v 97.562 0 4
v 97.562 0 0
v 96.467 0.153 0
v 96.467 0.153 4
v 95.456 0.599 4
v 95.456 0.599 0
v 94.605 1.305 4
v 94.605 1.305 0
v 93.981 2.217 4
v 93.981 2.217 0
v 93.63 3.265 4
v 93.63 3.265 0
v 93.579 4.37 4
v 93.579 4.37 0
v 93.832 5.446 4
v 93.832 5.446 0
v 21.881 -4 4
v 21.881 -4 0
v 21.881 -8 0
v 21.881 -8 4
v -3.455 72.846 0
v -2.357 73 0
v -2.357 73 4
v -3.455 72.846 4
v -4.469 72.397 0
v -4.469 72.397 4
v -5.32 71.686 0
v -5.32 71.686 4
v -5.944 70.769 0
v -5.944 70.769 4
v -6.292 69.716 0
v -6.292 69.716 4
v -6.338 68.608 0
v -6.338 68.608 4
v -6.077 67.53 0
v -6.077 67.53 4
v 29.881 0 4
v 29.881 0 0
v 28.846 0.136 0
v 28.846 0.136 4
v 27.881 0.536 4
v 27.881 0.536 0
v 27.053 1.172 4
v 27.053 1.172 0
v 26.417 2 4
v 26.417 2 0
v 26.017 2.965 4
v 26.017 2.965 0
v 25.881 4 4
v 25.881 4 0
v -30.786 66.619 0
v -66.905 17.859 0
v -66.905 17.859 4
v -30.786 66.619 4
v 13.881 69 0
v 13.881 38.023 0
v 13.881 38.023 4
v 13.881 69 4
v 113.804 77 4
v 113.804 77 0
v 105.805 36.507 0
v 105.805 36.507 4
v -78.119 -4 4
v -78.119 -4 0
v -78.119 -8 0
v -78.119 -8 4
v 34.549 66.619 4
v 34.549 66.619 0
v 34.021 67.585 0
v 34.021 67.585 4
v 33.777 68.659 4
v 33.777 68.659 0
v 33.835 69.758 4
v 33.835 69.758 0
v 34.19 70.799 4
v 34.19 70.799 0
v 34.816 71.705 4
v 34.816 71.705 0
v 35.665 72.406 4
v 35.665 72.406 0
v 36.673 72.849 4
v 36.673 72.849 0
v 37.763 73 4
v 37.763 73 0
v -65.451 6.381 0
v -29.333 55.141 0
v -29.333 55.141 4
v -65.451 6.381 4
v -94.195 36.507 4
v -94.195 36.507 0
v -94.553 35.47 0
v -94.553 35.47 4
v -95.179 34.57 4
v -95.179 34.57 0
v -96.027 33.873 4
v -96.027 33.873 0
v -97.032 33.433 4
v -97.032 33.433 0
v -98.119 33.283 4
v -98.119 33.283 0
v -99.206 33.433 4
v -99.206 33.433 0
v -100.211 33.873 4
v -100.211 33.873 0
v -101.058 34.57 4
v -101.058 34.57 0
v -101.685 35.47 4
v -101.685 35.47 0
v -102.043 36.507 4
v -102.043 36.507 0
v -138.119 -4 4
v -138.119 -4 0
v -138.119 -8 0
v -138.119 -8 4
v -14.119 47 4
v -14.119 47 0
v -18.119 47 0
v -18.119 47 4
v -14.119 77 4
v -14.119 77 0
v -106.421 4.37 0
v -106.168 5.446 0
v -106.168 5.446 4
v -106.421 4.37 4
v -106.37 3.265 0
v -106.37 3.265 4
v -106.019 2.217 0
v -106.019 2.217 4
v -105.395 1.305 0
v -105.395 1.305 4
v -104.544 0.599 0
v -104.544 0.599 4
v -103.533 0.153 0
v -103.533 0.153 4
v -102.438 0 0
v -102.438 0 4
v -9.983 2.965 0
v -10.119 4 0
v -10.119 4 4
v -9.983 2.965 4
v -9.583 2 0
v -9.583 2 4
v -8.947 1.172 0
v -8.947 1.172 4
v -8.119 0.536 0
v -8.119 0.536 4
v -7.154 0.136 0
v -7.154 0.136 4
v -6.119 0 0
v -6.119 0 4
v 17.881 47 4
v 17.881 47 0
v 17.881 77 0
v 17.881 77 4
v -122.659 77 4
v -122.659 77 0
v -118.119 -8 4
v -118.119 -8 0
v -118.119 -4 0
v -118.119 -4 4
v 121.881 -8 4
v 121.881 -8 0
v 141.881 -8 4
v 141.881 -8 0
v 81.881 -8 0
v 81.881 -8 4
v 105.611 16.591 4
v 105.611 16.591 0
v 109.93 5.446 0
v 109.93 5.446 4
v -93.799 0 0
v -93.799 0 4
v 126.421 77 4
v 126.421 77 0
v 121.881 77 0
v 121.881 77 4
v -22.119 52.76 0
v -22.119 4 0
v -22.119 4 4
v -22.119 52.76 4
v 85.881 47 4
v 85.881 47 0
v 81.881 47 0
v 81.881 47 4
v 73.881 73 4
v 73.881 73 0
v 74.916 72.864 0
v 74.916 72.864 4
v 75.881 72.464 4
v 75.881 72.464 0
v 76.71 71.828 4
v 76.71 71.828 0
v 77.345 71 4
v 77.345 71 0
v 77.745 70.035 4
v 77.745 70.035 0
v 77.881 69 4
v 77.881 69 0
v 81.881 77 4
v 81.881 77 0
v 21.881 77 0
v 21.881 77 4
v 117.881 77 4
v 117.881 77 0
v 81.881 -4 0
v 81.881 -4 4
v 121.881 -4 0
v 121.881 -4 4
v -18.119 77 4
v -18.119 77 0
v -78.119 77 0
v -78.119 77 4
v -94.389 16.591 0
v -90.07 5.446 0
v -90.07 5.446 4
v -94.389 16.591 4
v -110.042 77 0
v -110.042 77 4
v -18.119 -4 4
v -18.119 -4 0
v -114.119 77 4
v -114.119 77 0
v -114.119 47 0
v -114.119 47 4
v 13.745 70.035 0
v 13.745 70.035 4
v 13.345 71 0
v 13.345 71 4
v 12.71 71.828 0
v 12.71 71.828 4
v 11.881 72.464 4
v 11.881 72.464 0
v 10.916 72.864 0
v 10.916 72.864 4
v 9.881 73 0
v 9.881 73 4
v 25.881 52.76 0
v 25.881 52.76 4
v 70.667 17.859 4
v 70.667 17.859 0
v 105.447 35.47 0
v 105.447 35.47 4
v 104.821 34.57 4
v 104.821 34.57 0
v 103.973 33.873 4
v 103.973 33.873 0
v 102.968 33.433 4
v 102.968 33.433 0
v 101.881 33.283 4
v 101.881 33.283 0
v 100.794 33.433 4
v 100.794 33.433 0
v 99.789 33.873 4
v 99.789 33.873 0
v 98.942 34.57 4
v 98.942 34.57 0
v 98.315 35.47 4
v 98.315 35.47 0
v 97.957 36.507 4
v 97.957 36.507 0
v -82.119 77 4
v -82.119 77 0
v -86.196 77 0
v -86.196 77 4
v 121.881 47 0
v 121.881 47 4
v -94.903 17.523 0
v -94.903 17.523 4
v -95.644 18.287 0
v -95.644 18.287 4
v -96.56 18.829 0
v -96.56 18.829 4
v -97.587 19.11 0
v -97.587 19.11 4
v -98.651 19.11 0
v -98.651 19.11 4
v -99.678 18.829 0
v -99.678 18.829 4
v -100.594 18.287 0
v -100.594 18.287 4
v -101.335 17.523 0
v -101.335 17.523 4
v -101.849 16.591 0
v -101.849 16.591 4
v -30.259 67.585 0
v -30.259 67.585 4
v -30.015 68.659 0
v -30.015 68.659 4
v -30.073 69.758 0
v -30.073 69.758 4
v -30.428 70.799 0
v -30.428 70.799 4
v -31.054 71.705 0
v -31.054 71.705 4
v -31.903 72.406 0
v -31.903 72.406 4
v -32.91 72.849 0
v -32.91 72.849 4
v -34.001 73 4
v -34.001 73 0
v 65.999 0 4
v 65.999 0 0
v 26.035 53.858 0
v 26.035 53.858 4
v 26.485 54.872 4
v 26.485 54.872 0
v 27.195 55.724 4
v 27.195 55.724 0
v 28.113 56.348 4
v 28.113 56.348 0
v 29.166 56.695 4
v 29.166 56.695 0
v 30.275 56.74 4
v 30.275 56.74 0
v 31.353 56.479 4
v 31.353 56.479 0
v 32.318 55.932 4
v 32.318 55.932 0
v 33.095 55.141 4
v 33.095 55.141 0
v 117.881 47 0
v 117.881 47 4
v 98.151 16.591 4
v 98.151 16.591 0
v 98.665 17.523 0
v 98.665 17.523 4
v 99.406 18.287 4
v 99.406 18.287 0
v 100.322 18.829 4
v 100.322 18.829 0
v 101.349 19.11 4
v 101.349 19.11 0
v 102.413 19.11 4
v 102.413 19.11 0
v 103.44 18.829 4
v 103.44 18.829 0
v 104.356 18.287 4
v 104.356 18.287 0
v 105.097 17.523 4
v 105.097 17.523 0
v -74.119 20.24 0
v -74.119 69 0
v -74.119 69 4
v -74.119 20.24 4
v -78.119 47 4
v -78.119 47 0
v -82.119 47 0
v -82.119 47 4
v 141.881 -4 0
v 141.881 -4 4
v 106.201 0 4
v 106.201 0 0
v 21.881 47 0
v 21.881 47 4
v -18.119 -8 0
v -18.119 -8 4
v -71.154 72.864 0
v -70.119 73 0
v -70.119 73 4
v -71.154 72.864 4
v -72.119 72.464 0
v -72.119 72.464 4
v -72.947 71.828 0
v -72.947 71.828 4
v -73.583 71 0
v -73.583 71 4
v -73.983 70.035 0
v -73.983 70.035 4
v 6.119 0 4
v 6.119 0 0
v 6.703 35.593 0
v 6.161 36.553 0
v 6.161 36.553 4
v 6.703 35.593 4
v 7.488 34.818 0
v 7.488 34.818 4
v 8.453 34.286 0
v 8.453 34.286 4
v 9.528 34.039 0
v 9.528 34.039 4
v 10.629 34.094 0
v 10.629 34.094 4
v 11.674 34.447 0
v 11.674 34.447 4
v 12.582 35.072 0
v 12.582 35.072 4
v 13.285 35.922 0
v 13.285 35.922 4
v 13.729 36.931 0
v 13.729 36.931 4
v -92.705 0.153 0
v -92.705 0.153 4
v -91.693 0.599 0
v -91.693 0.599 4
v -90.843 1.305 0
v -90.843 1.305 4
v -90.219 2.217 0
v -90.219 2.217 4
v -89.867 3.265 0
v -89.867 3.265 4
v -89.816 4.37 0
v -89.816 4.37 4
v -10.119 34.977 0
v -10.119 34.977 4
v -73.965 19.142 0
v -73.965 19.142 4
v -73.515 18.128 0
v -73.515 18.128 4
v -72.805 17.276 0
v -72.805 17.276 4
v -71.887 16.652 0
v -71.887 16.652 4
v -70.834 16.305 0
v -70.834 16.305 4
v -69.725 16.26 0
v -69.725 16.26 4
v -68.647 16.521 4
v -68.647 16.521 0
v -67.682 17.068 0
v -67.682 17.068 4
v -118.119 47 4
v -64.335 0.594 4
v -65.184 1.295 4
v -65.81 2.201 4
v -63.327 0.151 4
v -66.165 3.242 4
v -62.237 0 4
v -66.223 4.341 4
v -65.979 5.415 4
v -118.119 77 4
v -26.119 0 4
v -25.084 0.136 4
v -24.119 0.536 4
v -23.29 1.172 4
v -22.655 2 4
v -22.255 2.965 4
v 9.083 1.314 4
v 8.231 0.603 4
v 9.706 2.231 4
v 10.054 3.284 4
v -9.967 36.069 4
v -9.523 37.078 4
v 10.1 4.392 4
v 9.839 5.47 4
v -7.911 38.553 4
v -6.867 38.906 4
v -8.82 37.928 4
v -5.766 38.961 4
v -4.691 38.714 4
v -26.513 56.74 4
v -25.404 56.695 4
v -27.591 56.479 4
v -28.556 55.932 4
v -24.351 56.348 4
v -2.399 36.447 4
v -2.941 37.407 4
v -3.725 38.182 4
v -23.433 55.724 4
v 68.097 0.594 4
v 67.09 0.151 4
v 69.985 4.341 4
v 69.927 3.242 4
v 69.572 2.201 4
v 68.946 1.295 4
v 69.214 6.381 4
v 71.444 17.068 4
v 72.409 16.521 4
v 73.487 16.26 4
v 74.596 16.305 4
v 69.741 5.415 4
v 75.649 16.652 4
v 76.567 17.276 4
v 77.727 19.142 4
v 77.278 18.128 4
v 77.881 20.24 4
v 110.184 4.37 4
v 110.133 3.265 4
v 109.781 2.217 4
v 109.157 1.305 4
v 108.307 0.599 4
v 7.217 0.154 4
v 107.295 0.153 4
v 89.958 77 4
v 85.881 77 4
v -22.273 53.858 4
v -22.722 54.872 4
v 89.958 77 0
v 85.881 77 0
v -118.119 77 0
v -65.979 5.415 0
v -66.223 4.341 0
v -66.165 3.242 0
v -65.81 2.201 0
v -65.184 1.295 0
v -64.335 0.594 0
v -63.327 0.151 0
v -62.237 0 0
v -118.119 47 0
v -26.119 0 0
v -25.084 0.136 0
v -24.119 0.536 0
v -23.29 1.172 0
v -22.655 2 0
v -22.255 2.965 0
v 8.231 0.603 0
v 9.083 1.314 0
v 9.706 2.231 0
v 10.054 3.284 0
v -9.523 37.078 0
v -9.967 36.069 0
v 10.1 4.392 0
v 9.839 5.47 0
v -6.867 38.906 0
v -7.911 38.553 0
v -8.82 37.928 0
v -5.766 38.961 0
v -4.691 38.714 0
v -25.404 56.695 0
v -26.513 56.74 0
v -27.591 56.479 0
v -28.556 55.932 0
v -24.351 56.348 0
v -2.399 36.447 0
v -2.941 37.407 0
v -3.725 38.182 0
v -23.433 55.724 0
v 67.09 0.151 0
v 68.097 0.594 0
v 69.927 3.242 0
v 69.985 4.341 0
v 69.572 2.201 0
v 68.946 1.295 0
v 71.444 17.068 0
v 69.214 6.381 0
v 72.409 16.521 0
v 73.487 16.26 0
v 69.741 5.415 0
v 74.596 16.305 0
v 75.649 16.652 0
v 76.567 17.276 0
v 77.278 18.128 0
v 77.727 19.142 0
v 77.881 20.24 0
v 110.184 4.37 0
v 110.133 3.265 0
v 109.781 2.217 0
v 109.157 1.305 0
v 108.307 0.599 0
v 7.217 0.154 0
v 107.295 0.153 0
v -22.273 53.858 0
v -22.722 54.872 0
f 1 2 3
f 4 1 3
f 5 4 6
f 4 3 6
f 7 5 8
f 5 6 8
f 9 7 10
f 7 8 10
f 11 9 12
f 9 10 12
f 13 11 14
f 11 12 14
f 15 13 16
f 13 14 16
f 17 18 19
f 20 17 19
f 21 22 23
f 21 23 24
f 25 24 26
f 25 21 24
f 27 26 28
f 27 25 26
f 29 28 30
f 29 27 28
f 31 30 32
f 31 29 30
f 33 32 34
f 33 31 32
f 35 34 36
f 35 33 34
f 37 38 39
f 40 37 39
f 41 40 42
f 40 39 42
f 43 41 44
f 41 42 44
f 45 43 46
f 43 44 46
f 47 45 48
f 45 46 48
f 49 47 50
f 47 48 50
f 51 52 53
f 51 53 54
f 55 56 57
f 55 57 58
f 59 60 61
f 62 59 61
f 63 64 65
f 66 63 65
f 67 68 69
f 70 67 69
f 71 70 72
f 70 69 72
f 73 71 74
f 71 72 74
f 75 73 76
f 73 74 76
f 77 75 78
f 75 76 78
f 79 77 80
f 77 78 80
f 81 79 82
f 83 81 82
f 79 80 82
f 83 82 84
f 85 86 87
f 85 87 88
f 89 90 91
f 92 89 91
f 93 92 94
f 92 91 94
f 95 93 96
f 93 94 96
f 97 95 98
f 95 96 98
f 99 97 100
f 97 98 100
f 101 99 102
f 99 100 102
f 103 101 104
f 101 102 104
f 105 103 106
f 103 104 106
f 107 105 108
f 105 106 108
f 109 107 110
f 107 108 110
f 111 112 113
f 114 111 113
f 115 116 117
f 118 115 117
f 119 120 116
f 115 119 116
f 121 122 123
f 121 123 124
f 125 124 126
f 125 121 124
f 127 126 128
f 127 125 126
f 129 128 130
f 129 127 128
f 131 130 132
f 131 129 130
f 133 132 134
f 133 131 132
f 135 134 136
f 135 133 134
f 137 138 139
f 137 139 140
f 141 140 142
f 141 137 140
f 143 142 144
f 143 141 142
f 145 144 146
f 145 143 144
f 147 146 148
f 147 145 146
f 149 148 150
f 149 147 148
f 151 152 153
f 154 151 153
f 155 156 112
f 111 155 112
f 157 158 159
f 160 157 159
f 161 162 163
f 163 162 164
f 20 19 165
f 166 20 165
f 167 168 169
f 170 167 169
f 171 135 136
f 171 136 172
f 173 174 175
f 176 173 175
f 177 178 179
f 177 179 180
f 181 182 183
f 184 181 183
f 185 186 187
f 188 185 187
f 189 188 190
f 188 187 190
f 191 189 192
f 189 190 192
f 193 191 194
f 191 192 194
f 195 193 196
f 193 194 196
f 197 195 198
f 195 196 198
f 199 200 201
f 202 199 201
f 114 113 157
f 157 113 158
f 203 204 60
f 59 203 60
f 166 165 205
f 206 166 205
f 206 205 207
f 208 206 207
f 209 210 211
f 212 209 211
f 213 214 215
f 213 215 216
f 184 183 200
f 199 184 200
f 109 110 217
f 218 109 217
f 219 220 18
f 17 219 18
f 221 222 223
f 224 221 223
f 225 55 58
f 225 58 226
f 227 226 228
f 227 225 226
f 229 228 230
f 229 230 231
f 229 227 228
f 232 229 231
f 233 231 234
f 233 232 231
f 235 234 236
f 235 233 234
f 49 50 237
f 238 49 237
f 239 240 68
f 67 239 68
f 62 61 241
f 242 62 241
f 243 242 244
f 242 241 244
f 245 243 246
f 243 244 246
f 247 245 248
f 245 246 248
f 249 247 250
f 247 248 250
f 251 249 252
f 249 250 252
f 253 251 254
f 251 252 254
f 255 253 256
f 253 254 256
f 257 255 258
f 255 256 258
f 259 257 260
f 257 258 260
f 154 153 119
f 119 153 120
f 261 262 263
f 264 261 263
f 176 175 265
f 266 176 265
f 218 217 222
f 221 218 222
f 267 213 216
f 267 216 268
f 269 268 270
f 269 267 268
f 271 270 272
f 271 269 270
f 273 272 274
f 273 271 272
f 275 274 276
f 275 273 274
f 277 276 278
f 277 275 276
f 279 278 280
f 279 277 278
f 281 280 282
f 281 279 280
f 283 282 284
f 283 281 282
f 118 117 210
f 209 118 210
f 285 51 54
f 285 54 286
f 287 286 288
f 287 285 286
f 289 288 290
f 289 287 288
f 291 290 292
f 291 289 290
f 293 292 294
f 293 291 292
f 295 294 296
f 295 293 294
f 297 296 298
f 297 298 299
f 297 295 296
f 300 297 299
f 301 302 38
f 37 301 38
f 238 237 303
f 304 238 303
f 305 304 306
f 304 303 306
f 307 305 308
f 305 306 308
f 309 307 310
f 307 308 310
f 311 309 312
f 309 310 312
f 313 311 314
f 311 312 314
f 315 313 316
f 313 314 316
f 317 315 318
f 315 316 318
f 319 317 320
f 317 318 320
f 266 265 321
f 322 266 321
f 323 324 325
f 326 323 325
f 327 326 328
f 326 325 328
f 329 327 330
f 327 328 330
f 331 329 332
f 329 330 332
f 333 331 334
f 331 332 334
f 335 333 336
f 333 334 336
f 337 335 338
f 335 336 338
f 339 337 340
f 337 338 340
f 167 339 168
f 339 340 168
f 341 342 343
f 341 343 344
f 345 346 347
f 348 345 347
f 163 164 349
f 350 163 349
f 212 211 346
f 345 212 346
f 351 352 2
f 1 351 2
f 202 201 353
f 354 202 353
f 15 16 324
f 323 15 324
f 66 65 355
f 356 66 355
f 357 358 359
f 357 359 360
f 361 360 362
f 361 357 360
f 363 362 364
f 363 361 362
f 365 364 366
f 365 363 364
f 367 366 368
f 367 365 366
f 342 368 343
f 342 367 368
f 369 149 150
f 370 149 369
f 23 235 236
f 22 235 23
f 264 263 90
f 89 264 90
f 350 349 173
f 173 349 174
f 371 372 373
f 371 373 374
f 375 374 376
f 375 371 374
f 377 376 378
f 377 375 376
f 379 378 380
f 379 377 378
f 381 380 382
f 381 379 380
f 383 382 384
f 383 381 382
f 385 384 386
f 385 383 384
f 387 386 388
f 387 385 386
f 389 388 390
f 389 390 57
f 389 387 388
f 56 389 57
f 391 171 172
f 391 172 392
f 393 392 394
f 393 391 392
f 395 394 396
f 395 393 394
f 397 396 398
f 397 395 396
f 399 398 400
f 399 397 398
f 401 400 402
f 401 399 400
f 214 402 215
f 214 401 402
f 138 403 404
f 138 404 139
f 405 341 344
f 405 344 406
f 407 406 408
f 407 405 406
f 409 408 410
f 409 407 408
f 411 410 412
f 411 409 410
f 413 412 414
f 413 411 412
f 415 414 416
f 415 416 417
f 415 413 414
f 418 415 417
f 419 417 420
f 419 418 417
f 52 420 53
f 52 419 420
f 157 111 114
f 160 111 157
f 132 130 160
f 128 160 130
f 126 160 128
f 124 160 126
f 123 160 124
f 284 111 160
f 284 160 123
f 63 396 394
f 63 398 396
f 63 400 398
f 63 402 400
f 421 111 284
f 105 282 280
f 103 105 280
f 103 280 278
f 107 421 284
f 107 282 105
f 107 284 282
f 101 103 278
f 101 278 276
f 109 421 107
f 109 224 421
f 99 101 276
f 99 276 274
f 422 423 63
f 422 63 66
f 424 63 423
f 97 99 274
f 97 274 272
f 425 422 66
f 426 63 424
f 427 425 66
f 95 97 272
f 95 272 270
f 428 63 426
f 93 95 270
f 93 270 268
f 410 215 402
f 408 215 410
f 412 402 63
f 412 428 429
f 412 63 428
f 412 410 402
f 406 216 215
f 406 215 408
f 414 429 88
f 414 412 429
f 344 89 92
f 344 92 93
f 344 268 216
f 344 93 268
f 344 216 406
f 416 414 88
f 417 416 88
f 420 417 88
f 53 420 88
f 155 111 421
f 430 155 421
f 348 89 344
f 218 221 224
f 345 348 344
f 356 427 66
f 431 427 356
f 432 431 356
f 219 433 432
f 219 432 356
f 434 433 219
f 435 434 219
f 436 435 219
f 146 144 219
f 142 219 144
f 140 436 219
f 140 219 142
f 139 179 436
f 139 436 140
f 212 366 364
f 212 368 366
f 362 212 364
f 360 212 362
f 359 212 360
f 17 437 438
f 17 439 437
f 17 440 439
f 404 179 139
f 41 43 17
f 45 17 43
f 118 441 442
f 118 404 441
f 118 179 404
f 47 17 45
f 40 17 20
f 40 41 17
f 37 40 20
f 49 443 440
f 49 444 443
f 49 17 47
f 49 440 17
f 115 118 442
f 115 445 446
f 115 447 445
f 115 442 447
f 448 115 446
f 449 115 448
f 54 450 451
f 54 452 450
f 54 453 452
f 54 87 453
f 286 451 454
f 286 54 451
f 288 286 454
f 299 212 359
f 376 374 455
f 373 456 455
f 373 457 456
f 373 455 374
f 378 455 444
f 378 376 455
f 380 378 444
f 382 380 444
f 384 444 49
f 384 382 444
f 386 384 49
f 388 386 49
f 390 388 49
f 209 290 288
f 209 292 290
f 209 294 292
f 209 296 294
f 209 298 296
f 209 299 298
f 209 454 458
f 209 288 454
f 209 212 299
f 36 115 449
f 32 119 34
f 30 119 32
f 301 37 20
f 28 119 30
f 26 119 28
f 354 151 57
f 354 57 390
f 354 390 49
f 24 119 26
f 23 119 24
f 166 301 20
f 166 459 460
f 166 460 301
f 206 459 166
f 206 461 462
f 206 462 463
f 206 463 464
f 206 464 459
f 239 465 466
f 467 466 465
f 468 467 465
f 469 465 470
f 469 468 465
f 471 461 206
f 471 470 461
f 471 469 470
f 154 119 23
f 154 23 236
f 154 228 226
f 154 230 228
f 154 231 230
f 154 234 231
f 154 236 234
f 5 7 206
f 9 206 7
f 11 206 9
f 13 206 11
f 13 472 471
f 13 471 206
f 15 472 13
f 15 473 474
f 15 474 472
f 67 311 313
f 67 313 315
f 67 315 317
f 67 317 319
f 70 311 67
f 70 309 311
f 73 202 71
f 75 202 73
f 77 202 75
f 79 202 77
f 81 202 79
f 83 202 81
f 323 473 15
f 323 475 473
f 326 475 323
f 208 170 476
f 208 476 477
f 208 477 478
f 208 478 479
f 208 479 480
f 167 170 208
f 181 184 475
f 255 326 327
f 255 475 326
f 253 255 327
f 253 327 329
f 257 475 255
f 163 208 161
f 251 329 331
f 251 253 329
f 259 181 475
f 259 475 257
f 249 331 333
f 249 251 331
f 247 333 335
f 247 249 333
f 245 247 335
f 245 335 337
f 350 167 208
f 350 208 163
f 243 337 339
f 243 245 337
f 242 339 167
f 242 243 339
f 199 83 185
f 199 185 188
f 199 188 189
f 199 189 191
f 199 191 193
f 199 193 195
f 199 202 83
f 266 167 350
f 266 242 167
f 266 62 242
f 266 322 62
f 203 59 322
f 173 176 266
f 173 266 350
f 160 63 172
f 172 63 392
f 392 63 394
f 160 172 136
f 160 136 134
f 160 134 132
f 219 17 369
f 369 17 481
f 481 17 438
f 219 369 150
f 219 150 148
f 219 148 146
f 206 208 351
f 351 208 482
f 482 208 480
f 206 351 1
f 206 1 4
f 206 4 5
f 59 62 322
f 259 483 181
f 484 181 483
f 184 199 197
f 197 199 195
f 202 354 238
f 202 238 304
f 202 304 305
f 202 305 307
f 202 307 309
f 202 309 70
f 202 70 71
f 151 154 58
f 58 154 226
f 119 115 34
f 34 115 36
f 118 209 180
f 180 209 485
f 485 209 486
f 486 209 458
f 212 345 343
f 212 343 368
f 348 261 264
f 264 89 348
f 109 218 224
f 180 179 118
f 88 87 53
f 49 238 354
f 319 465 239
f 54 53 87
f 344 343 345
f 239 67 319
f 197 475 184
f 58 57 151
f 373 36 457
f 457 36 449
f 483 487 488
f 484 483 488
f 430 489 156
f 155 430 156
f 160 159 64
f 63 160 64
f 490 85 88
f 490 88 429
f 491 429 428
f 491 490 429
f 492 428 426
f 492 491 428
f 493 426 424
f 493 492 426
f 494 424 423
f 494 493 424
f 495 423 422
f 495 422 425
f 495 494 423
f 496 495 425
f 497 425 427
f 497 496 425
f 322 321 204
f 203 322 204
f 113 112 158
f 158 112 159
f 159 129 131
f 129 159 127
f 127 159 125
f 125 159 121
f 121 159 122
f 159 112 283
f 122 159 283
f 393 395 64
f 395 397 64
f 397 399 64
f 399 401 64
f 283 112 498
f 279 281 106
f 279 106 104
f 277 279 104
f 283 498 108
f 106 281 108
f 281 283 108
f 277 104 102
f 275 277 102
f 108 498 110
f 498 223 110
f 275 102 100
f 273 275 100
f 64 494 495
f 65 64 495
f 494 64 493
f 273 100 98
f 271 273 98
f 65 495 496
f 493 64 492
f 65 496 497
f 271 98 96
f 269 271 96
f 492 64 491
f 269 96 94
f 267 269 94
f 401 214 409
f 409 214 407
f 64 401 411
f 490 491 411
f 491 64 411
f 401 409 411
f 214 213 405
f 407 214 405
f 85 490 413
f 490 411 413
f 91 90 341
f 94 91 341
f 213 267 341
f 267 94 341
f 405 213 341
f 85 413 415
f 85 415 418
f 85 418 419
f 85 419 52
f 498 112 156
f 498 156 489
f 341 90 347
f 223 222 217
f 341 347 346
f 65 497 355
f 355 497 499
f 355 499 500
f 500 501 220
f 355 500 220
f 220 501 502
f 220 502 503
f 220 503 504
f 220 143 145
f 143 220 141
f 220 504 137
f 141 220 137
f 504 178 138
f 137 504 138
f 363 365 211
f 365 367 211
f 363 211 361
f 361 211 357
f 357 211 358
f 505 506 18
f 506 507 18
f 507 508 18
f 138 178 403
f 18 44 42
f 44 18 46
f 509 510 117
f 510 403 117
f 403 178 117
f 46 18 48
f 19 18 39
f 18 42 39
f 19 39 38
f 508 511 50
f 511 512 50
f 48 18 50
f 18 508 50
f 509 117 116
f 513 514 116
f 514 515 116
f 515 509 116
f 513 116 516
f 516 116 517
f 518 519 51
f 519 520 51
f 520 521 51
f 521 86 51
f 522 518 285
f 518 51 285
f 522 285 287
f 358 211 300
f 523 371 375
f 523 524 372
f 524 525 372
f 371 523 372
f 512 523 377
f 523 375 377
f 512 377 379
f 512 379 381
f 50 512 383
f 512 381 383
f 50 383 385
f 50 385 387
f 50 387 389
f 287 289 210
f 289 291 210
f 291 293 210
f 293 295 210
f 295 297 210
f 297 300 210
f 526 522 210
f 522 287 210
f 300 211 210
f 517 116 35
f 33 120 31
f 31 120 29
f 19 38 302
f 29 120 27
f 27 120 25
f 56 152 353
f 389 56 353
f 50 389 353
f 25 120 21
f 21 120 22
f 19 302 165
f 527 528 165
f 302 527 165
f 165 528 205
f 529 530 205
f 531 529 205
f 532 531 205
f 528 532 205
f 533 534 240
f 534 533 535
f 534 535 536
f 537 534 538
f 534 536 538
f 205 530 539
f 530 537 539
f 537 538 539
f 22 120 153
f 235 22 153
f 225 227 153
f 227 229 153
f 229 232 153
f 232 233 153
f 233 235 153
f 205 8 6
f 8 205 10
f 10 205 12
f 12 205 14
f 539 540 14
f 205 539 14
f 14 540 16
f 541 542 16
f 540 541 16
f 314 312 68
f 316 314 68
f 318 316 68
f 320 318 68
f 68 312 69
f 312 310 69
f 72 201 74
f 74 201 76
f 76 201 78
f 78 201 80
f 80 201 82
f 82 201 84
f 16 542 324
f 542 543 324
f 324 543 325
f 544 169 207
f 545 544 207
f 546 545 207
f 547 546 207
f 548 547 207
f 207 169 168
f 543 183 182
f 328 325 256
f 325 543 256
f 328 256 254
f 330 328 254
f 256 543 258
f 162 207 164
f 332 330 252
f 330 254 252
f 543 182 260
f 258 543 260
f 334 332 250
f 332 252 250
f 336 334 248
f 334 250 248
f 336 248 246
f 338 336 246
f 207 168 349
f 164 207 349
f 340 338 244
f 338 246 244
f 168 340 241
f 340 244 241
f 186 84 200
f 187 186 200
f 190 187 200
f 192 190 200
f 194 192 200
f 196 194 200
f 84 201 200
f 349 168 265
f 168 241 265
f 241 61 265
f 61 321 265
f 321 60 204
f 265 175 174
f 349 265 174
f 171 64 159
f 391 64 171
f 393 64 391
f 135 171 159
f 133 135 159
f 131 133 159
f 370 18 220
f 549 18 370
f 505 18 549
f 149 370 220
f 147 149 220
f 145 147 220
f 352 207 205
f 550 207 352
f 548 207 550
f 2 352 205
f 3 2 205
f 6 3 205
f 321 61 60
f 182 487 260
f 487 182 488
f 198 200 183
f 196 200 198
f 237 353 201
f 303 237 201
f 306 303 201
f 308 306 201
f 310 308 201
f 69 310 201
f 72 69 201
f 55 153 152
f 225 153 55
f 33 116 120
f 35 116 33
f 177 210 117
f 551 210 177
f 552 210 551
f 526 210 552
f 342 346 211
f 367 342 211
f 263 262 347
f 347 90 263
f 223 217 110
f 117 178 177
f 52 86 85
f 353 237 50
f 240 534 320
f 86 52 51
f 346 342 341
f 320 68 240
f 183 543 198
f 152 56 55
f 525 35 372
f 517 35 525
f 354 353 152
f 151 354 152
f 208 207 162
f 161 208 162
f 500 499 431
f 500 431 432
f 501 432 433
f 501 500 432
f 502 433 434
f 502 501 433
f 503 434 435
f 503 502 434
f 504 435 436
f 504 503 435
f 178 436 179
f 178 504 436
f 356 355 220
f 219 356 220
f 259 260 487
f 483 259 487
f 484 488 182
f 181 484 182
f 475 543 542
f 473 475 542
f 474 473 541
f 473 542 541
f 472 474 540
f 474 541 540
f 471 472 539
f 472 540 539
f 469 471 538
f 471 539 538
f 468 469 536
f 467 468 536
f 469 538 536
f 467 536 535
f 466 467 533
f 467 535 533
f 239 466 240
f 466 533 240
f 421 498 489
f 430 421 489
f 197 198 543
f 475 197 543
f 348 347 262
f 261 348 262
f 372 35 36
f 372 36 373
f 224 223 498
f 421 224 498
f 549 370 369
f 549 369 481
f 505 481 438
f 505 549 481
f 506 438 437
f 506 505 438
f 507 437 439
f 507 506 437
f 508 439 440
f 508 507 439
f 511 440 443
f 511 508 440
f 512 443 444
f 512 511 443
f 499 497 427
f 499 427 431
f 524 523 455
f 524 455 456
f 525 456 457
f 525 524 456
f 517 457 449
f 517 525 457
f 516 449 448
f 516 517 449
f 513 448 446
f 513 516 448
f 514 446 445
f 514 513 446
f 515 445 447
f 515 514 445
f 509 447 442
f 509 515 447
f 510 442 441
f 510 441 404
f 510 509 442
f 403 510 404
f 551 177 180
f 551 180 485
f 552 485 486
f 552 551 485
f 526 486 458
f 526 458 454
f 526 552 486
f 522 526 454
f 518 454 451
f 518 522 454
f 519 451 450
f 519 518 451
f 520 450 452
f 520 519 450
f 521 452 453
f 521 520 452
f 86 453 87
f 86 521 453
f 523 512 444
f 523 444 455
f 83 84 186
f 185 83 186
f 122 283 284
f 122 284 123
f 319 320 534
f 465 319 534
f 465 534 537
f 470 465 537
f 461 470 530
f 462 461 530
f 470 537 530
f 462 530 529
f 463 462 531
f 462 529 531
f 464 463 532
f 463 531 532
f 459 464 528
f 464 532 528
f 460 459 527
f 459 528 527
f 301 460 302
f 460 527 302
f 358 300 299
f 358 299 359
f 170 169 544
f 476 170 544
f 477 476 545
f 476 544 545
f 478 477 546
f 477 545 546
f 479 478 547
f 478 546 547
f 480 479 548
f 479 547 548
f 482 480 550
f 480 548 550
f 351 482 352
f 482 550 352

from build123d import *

# Parameters (mm, degrees)
BOSS_EXTRUDE1_DEPTH = 4


with BuildPart() as part:
    # Sketch2 → Boss-Extrude1 (new body)
    with BuildSketch(Plane.XY):
        with BuildLine():
            Line((-138.118918248, -4), (-138.118918248, -8))
            Line((-138.118918248, -8), (-118.118918248, -8))
            Line((-118.118918248, -8), (-118.118918248, -4))
            Line((-118.118918248, -4), (-78.118918248, -4))
            Line((-78.118918248, -4), (-78.118918248, -8))
            Line((-78.118918248, -8), (-18.118918248, -8))
            Line((-18.118918248, -8), (-18.118918248, -4))
            Line((-18.118918248, -4), (21.881081752, -4))
            Line((21.881081752, -4), (21.881081752, -8))
            Line((21.881081752, -8), (81.881081752, -8))
            Line((81.881081752, -8), (81.881081752, -4))
            Line((81.881081752, -4), (121.881081752, -4))
            Line((121.881081752, -4), (121.881081752, -8))
            Line((121.881081752, -8), (141.881081752, -8))
            Line((141.881081752, -8), (141.881081752, -4))
            Line((141.881081752, -4), (126.420932439, 77))
            Line((126.420932439, 77), (121.881081752, 77))
            Line((121.881081752, 77), (121.881081752, 47))
            Line((121.881081752, 47), (117.881081752, 47))
            Line((117.881081752, 47), (117.881081752, 77))
            Line((117.881081752, 77), (113.803791589, 77))
            Line((113.803791589, 77), (105.805256721, 36.507417232))
            ThreePointArc((105.805256721, 36.507417232), (101.881081752, 33.282562905), (97.956906783, 36.507417232))
            Line((97.956906783, 36.507417232), (89.958371916, 77))
            Line((89.958371916, 77), (85.881081752, 77))
            Line((85.881081752, 77), (85.881081752, 47))
            Line((85.881081752, 47), (81.881081752, 47))
            Line((81.881081752, 47), (81.881081752, 77))
            Line((81.881081752, 77), (21.881081752, 77))
            Line((21.881081752, 77), (21.881081752, 47))
            Line((21.881081752, 47), (17.881081752, 47))
            Line((17.881081752, 47), (17.881081752, 77))
            Line((17.881081752, 77), (-14.118918248, 77))
            Line((-14.118918248, 77), (-14.118918248, 47))
            Line((-14.118918248, 47), (-18.118918248, 47))
            Line((-18.118918248, 47), (-18.118918248, 77))
            Line((-18.118918248, 77), (-78.118918248, 77))
            Line((-78.118918248, 77), (-78.118918248, 47))
            Line((-78.118918248, 47), (-82.118918248, 47))
            Line((-82.118918248, 47), (-82.118918248, 77))
            Line((-82.118918248, 77), (-86.196208411, 77))
            Line((-86.196208411, 77), (-94.194743279, 36.507417232))
            ThreePointArc((-94.194743279, 36.507417232), (-98.118918248, 33.282562905), (-102.043093217, 36.507417232))
            Line((-102.043093217, 36.507417232), (-110.041628084, 77))
            Line((-110.041628084, 77), (-114.118918248, 77))
            Line((-114.118918248, 77), (-114.118918248, 47))
            Line((-114.118918248, 47), (-118.118918248, 47))
            Line((-118.118918248, 47), (-118.118918248, 77))
            Line((-118.118918248, 77), (-122.658768935, 77))
            Line((-122.658768935, 77), (-138.118918248, -4))
        make_face()
        with BuildLine():
            Line((-102.438497969, 0), (-93.799338527, 0))
            ThreePointArc((-93.799338527, 0), (-90.499180816, 1.739699338), (-90.069664197, 5.445520459))
            Line((-90.069664197, 5.445520459), (-94.389243919, 16.590728056))
            ThreePointArc((-94.389243919, 16.590728056), (-98.118918248, 19.145207598), (-101.848592577, 16.590728056))
            Line((-101.848592577, 16.590728056), (-106.168172299, 5.445520459))
            ThreePointArc((-106.168172299, 5.445520459), (-105.73865568, 1.739699338), (-102.438497969, 0))
        make_face(mode=Mode.SUBTRACT)
        with BuildLine():
            Line((-22.118918248, 4), (-22.118918248, 52.759761907))
            ThreePointArc((-22.118918248, 52.759761907), (-24.865306485, 56.558242859), (-29.333147021, 55.140672109))
            Line((-29.333147021, 55.140672109), (-65.451489175, 6.380910203))
            ThreePointArc((-65.451489175, 6.380910203), (-65.80962942, 2.200505739), (-62.237260401, 0))
            Line((-62.237260401, 0), (-26.118918248, 0))
            ThreePointArc((-26.118918248, 0), (-23.290491123, 1.171572875), (-22.118918248, 4))
        make_face(mode=Mode.SUBTRACT)
        with BuildLine():
            Line((-34.000576095, 73), (-70.118918248, 73))
            ThreePointArc((-70.118918248, 73), (-72.947345373, 71.828427125), (-74.118918248, 69))
            Line((-74.118918248, 69), (-74.118918248, 20.240238093))
            ThreePointArc((-74.118918248, 20.240238093), (-71.372530011, 16.441757141), (-66.904689475, 17.859327891))
            Line((-66.904689475, 17.859327891), (-30.786347321, 66.619089797))
            ThreePointArc((-30.786347321, 66.619089797), (-30.428207076, 70.799494261), (-34.000576095, 73))
        make_face(mode=Mode.SUBTRACT)
        with BuildLine():
            Line((9.881081752, 73), (-2.356754744, 73))
            ThreePointArc((-2.356754744, 73), (-5.664234687, 71.249572499), (-6.076962704, 67.530288213))
            Line((-6.076962704, 67.530288213), (6.160873792, 36.553264583))
            ThreePointArc((6.160873792, 36.553264583), (10.62913528, 34.093546905), (13.881081752, 38.02297637))
            Line((13.881081752, 38.02297637), (13.881081752, 69))
            ThreePointArc((13.881081752, 69), (12.709508877, 71.828427125), (9.881081752, 73))
        make_face(mode=Mode.SUBTRACT)
        with BuildLine():
            Line((-6.118918248, 0), (6.118918248, 0))
            ThreePointArc((6.118918248, 0), (9.426398191, 1.750427501), (9.839126208, 5.469711787))
            Line((9.839126208, 5.469711787), (-2.398710288, 36.446735417))
            ThreePointArc((-2.398710288, 36.446735417), (-6.866971776, 38.906453095), (-10.118918248, 34.97702363))
            Line((-10.118918248, 34.97702363), (-10.118918248, 4))
            ThreePointArc((-10.118918248, 4), (-8.947345373, 1.171572875), (-6.118918248, 0))
        make_face(mode=Mode.SUBTRACT)
        with BuildLine():
            Line((105.610756081, 16.590728056), (109.930335803, 5.445520459))
            ThreePointArc((109.930335803, 5.445520459), (109.500819184, 1.739699338), (106.200661473, 0))
            Line((106.200661473, 0), (97.561502031, 0))
            ThreePointArc((97.561502031, 0), (94.26134432, 1.739699338), (93.831827701, 5.445520459))
            Line((93.831827701, 5.445520459), (98.151407423, 16.590728056))
            ThreePointArc((98.151407423, 16.590728056), (101.881081752, 19.145207598), (105.610756081, 16.590728056))
        make_face(mode=Mode.SUBTRACT)
        with BuildLine():
            Line((70.666852979, 17.859327891), (34.548510825, 66.619089797))
            ThreePointArc((34.548510825, 66.619089797), (34.19037058, 70.799494261), (37.762739599, 73))
            Line((37.762739599, 73), (73.881081752, 73))
            ThreePointArc((73.881081752, 73), (76.709508877, 71.828427125), (77.881081752, 69))
            Line((77.881081752, 69), (77.881081752, 20.240238093))
            ThreePointArc((77.881081752, 20.240238093), (75.134693515, 16.441757141), (70.666852979, 17.859327891))
        make_face(mode=Mode.SUBTRACT)
        with BuildLine():
            Line((65.999423905, 0), (29.881081752, 0))
            ThreePointArc((29.881081752, 0), (27.052654627, 1.171572875), (25.881081752, 4))
            Line((25.881081752, 4), (25.881081752, 52.759761907))
            ThreePointArc((25.881081752, 52.759761907), (28.627469989, 56.558242859), (33.095310525, 55.140672109))
            Line((33.095310525, 55.140672109), (69.213652679, 6.380910203))
            ThreePointArc((69.213652679, 6.380910203), (69.571792924, 2.200505739), (65.999423905, 0))
        make_face(mode=Mode.SUBTRACT)
    extrude(amount=BOSS_EXTRUDE1_DEPTH)


solid = part.part
